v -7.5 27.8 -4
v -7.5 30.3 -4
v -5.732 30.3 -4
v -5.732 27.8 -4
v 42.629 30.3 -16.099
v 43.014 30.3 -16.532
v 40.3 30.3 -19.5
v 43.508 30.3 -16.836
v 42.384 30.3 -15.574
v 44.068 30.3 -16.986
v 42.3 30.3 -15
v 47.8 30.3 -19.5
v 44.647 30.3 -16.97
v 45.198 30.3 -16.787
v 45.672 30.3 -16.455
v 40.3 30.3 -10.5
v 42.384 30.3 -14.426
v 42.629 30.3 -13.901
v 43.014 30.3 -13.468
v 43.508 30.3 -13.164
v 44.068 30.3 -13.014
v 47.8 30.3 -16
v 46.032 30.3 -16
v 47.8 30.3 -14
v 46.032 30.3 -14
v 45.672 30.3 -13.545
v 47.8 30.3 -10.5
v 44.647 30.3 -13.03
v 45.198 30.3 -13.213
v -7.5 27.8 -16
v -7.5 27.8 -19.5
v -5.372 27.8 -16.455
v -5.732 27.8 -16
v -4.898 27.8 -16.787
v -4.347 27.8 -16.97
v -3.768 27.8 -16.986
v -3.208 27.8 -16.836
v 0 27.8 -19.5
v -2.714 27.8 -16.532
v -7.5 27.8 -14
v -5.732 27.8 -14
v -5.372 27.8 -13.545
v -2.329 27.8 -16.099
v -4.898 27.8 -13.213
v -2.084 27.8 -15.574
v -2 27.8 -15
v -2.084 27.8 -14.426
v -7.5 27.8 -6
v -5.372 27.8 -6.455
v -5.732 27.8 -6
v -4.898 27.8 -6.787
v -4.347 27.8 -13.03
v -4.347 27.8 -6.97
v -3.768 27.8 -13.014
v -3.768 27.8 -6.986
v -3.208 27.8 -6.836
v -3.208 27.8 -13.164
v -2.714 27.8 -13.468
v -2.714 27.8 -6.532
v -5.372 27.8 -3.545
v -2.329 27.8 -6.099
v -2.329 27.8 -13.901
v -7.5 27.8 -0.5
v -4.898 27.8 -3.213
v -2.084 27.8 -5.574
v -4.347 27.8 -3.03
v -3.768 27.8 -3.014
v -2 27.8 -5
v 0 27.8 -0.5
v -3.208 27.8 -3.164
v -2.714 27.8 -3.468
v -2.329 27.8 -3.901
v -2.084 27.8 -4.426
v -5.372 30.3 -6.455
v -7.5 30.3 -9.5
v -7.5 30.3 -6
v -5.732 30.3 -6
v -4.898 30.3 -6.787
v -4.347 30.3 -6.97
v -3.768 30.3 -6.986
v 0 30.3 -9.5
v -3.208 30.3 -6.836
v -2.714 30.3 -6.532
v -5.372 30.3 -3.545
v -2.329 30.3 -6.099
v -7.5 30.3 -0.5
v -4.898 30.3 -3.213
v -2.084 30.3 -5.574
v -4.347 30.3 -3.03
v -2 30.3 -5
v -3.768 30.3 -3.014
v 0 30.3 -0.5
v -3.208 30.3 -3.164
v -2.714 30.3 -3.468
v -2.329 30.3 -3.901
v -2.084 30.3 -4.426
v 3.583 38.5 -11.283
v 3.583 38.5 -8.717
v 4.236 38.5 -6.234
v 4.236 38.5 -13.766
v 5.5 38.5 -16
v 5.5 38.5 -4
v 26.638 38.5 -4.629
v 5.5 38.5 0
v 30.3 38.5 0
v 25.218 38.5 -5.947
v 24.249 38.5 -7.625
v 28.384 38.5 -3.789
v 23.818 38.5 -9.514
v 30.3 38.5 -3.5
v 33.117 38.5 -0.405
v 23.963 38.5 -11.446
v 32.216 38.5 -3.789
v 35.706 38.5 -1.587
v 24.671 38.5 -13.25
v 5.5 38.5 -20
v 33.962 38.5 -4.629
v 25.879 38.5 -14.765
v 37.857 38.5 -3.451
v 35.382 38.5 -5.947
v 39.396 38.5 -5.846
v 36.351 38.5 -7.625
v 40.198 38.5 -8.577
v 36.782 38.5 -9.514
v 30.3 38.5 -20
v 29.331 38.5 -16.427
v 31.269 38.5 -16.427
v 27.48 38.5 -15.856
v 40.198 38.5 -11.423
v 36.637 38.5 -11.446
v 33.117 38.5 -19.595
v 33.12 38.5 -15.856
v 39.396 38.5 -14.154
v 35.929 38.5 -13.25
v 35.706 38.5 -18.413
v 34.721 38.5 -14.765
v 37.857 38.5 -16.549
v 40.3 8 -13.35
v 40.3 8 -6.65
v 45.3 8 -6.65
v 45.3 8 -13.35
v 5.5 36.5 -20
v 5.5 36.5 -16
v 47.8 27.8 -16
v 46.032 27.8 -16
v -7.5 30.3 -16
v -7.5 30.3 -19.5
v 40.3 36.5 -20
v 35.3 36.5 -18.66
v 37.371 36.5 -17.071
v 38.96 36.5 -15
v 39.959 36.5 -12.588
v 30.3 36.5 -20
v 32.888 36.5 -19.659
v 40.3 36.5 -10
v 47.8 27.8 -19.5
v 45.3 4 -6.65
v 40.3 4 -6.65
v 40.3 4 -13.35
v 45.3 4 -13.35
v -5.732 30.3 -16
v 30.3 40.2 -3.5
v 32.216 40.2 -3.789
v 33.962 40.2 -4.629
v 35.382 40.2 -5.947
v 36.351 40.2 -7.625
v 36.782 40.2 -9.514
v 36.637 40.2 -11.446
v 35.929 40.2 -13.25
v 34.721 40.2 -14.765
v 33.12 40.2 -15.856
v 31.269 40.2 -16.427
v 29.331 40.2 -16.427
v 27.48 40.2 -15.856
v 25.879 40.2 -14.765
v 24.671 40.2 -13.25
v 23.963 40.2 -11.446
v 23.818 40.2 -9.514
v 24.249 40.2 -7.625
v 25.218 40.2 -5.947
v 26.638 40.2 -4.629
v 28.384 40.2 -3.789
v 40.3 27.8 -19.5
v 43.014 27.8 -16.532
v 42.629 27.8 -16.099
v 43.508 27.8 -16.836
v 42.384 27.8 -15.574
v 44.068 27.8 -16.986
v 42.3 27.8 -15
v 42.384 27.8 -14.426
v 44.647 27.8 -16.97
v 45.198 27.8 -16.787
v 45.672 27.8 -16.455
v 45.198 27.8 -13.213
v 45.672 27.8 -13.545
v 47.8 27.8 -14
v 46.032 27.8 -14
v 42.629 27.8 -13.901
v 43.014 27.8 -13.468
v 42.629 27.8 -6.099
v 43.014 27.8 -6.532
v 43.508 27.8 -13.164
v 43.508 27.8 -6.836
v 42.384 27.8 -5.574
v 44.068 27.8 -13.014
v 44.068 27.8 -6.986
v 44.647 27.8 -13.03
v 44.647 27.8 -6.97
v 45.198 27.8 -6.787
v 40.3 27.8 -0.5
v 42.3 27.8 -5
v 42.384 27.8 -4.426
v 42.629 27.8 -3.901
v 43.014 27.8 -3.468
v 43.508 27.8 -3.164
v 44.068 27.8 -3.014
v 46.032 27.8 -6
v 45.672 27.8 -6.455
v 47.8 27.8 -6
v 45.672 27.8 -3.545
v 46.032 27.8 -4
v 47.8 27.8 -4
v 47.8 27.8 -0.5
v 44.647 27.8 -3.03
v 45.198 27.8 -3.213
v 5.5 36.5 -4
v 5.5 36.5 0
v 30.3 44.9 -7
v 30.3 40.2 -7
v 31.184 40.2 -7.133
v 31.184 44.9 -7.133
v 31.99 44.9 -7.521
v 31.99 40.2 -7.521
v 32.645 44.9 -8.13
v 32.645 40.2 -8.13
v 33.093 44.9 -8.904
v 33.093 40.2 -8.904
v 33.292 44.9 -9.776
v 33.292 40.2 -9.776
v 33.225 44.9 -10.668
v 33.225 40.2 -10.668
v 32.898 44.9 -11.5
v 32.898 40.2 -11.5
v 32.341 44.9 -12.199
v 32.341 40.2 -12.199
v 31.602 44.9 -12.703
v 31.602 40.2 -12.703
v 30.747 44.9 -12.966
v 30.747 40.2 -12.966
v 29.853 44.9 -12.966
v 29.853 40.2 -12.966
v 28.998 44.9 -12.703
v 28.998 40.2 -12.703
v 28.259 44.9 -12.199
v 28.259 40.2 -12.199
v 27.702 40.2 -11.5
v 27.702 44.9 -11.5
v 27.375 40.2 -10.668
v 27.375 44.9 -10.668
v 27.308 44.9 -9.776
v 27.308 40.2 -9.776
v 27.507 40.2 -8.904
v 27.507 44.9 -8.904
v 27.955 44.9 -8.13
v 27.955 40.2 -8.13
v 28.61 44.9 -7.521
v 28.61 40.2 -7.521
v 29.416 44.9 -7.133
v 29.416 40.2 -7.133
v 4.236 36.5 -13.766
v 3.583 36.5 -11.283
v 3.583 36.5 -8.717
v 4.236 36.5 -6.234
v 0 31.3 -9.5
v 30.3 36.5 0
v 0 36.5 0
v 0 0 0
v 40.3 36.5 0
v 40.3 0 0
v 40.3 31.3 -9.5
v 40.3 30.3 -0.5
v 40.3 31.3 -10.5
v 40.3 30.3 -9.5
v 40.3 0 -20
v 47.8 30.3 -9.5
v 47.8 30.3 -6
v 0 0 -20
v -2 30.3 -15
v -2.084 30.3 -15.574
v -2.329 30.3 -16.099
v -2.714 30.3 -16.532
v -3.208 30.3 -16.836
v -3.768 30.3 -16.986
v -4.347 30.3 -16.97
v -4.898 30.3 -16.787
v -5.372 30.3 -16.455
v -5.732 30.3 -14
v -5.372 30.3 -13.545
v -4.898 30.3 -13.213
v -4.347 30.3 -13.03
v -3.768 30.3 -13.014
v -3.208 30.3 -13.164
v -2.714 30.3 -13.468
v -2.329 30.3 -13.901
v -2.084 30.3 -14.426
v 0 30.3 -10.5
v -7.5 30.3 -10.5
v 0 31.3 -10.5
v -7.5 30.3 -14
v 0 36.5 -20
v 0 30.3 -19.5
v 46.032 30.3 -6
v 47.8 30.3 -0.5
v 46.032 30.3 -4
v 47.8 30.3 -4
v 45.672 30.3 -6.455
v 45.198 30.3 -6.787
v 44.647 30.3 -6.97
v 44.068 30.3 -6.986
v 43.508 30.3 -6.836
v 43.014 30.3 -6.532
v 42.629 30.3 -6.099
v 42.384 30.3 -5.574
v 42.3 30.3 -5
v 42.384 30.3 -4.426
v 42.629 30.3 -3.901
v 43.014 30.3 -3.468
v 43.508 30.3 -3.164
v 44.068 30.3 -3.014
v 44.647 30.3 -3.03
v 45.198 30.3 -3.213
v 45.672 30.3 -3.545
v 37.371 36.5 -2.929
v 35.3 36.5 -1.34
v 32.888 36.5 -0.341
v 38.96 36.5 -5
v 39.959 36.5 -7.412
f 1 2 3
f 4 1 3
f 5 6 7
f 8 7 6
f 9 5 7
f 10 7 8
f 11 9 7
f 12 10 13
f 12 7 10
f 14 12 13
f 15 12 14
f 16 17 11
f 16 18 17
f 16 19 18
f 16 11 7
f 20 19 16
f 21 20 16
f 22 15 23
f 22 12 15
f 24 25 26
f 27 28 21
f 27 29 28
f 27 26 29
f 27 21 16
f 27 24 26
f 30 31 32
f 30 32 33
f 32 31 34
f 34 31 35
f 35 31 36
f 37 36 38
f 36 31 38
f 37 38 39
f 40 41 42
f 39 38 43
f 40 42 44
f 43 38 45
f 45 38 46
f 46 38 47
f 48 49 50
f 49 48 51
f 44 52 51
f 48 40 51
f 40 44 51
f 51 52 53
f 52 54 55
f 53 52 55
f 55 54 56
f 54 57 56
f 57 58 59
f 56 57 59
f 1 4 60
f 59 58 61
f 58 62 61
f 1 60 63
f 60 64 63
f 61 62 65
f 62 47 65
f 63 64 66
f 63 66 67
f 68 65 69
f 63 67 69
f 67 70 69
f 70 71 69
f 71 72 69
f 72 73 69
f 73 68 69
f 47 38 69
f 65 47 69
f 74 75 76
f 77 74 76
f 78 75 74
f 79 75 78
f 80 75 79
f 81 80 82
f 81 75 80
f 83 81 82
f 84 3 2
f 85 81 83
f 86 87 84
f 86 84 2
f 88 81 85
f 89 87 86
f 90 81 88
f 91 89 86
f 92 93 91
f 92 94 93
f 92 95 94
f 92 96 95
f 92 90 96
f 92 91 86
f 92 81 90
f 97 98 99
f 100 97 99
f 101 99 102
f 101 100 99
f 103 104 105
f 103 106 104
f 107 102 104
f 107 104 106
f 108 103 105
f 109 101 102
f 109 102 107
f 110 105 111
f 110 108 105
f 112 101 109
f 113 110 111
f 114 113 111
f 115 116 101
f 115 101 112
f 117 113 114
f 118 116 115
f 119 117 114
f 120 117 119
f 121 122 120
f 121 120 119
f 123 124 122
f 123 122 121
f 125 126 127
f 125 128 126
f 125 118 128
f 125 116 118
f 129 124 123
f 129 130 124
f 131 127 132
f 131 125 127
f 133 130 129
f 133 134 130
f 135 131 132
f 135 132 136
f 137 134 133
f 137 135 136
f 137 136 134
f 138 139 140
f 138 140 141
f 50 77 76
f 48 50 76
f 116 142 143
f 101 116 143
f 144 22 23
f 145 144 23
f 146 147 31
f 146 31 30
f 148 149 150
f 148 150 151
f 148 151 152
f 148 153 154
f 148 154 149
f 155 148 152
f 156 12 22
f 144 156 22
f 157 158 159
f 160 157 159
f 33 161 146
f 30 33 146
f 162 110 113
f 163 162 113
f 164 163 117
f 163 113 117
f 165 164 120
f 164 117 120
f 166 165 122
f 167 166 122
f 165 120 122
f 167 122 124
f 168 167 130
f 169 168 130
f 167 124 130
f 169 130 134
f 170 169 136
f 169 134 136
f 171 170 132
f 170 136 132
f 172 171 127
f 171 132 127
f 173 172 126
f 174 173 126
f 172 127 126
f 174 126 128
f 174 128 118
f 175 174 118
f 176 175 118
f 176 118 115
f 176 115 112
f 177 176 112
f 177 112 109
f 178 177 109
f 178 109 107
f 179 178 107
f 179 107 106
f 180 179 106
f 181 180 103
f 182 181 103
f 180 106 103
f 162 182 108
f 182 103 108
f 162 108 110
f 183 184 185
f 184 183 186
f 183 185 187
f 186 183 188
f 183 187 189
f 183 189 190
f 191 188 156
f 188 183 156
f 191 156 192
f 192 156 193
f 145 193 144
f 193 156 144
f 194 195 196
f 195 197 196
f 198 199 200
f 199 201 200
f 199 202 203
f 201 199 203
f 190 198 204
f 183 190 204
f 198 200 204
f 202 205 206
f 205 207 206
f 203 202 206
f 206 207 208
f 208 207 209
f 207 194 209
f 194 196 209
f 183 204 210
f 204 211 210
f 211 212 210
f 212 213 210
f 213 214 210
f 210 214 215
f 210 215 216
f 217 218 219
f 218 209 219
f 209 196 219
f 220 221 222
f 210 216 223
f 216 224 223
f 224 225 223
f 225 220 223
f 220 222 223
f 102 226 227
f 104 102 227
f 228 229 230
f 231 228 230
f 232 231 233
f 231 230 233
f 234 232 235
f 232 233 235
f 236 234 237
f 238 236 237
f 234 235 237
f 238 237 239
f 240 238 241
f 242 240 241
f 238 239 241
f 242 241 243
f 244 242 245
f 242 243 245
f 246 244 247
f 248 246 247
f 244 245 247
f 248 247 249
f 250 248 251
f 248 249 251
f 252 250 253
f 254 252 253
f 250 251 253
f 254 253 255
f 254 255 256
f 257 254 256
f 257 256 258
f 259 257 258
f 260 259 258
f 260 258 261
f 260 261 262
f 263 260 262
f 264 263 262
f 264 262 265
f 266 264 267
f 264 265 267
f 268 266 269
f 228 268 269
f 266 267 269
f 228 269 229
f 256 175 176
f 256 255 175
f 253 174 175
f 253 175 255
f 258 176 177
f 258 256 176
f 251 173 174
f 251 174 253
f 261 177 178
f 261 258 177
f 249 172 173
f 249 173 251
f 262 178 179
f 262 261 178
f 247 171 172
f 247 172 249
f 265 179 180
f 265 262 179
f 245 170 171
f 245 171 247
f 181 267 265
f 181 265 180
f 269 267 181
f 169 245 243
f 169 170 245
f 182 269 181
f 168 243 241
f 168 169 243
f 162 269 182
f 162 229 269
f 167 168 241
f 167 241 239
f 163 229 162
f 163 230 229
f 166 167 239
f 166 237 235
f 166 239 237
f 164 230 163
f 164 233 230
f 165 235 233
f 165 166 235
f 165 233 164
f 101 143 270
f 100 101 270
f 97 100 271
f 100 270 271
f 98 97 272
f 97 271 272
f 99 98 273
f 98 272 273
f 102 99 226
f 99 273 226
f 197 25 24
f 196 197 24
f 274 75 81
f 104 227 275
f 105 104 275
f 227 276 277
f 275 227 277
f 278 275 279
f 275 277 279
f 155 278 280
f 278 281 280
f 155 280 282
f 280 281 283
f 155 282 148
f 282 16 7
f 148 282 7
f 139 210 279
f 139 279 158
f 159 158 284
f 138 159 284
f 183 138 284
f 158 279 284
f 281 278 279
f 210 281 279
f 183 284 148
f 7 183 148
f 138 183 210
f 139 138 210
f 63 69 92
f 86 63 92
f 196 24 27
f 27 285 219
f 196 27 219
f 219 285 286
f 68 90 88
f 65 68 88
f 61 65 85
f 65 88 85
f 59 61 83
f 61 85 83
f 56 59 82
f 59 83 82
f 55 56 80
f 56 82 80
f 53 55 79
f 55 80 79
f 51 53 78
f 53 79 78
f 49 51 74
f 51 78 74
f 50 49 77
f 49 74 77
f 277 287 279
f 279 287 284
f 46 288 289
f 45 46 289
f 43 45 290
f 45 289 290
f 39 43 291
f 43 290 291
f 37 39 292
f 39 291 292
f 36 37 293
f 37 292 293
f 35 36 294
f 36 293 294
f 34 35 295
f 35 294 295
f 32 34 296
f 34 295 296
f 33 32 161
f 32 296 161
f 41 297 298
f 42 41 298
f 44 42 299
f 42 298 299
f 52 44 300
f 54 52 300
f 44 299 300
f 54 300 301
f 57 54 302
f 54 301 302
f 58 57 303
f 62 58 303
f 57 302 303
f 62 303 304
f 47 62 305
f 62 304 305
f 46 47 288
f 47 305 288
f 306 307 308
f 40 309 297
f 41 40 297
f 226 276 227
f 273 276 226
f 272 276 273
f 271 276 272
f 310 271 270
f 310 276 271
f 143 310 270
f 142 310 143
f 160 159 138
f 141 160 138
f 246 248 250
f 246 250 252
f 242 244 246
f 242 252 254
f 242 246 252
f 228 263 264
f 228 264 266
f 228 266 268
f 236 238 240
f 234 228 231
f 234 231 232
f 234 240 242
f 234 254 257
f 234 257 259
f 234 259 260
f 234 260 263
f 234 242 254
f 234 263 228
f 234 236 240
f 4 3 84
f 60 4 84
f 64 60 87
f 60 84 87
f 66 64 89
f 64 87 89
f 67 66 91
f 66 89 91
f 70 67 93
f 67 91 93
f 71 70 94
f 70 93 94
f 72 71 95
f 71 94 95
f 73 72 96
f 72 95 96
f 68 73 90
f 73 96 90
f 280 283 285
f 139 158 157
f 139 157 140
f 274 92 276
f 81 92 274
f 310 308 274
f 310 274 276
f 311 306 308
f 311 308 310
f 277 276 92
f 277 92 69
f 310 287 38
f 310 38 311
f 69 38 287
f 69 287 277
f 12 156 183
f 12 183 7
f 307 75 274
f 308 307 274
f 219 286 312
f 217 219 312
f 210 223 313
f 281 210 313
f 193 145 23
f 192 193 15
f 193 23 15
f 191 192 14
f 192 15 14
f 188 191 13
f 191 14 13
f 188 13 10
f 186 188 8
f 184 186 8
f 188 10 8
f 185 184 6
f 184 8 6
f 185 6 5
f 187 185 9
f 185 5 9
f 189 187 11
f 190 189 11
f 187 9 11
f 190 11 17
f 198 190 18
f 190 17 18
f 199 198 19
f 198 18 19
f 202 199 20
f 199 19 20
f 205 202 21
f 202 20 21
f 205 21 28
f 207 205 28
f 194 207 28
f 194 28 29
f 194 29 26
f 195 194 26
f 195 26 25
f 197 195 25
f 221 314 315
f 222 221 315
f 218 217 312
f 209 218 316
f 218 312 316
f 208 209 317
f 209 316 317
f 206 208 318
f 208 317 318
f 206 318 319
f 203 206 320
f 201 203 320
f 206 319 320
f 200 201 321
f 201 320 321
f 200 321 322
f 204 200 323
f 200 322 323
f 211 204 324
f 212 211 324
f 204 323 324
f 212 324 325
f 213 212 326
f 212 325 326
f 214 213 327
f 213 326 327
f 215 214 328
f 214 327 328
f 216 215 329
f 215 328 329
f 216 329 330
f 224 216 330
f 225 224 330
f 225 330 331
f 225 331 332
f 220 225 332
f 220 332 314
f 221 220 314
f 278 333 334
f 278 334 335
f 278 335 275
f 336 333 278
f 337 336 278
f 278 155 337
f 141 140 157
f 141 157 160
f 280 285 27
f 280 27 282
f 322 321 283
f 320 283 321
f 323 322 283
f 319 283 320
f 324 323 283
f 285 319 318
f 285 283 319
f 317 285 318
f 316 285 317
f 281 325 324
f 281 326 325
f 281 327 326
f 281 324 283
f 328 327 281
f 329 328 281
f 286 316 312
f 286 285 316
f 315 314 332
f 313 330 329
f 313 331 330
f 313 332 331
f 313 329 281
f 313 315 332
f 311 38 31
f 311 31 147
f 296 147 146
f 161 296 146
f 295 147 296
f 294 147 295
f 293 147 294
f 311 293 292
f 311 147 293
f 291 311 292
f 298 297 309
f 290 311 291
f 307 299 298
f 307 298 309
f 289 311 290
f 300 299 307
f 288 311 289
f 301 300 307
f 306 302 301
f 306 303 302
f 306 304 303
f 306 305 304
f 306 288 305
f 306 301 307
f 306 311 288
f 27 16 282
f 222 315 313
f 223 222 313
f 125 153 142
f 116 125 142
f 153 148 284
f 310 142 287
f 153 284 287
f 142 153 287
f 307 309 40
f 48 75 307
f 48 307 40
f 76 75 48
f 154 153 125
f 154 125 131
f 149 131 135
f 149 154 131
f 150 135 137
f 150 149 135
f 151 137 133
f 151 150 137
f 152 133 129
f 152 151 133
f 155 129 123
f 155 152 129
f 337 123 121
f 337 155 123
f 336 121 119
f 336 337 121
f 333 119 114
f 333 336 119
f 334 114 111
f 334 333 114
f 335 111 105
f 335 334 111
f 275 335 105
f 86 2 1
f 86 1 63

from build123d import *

# Parameters (mm, degrees)
SKETCH1_W                = 40.3
SKETCH1_H                = 20
BOSS_EXTRUDE1_DEPTH      = 36.5
BOSS_EXTRUDE2_DEPTH      = 7.5
BOSS_EXTRUDE2_DEPTH_BACK = 47.8
SKETCH2_W                = 19
SKETCH2_H                = 2.5
CUT_EXTRUDE1_DEPTH       = 7.5
SKETCH5_W                = 7.5
SKETCH5_H                = 1
BOSS_EXTRUDE3_DEPTH      = 1
CUT_EXTRUDE2_DEPTH       = 1
BOSS_EXTRUDE4_DEPTH      = 2
SKETCH8_R                = 6.5
BOSS_EXTRUDE5_DEPTH      = 1.7
SKETCH9_R                = 3
BOSS_EXTRUDE6_DEPTH      = 4.7
SKETCH10_W               = 6.7
SKETCH10_H               = 4
BOSS_EXTRUDE7_DEPTH      = 5


with BuildPart() as part:
    # Sketch1 → Boss-Extrude1 (new body)
    with BuildSketch(Plane(origin=(0, 0, 0), x_dir=(1, 0, 0), z_dir=(0, 1, 0))):
        with Locations((20.15, 10)):
            Rectangle(SKETCH1_W, SKETCH1_H)
    extrude(amount=BOSS_EXTRUDE1_DEPTH)

    # Sketch2 → Boss-Extrude2 (add, two sides: drawn at the far end of the back side and taken through both)
    with BuildSketch(Plane.ZY.offset(-BOSS_EXTRUDE2_DEPTH_BACK)):
        with Locations((-10, 29.05)):
            Rectangle(SKETCH2_W, SKETCH2_H)
    extrude(amount=BOSS_EXTRUDE2_DEPTH + BOSS_EXTRUDE2_DEPTH_BACK)

    # Sketch3 → Cut-Extrude1 (cut)
    with BuildSketch(Plane(origin=(0, 30.3, 0), x_dir=(1, 0, 0), z_dir=(0, 1, 0))):
        with BuildLine():
            Line((-5.732050808, 14), (-5.5, 14))
            Line((-5.5, 14), (-5.5, 16))
            Line((-5.5, 16), (-5.732050808, 16))
            ThreePointArc((-5.732050808, 16), (-6, 15), (-5.732050808, 14))
        make_face()
        with BuildLine():
            Line((-5.5, 16), (-5.5, 14))
            Line((-5.5, 14), (-5.732050808, 14))
            ThreePointArc((-5.732050808, 14), (-3.48236191, 13.068148347), (-2, 15))
            ThreePointArc((-2, 15), (-3.48236191, 16.931851653), (-5.732050808, 16))
            Line((-5.732050808, 16), (-5.5, 16))
        make_face()
        with BuildLine():
            Line((-7.5, 14), (-5.732050808, 14))
            ThreePointArc((-5.732050808, 14), (-6, 15), (-5.732050808, 16))
            Line((-5.732050808, 16), (-7.5, 16))
            Line((-7.5, 16), (-7.5, 14))
        make_face()
        with BuildLine():
            Line((-7.5, 4), (-5.732050808, 4))
            ThreePointArc((-5.732050808, 4), (-6, 5), (-5.732050808, 6))
            Line((-5.732050808, 6), (-7.5, 6))
            Line((-7.5, 6), (-7.5, 4))
        make_face()
        with BuildLine():
            Line((-5.732050808, 4), (-5.5, 4))
            Line((-5.5, 4), (-5.5, 6))
            Line((-5.5, 6), (-5.732050808, 6))
            ThreePointArc((-5.732050808, 6), (-6, 5), (-5.732050808, 4))
        make_face()
        with BuildLine():
            Line((-5.5, 6), (-5.5, 4))
            Line((-5.5, 4), (-5.732050808, 4))
            ThreePointArc((-5.732050808, 4), (-3.48236191, 3.068148347), (-2, 5))
            ThreePointArc((-2, 5), (-3.48236191, 6.931851653), (-5.732050808, 6))
            Line((-5.732050808, 6), (-5.5, 6))
        make_face()
        with BuildLine():
            ThreePointArc((46.032050808, 16), (42.3, 15), (46.032050808, 14))
            Line((46.032050808, 14), (45.8, 14))
            Line((45.8, 14), (45.8, 16))
            Line((45.8, 16), (46.032050808, 16))
        make_face()
        with BuildLine():
            Line((45.8, 14), (46.032050808, 14))
            ThreePointArc((46.032050808, 14), (46.231851653, 14.48236191), (46.3, 15))
            ThreePointArc((46.3, 15), (46.231851653, 15.51763809), (46.032050808, 16))
            Line((46.032050808, 16), (45.8, 16))
            Line((45.8, 16), (45.8, 14))
        make_face()
        with BuildLine():
            Line((46.032050808, 14), (47.8, 14))
            Line((47.8, 14), (47.8, 16))
            Line((47.8, 16), (46.032050808, 16))
            ThreePointArc((46.032050808, 16), (46.231851653, 15.51763809), (46.3, 15))
            ThreePointArc((46.3, 15), (46.231851653, 14.48236191), (46.032050808, 14))
        make_face()
        with BuildLine():
            ThreePointArc((46.032050808, 6), (42.3, 5), (46.032050808, 4))
            Line((46.032050808, 4), (45.8, 4))
            Line((45.8, 4), (45.8, 6))
            Line((45.8, 6), (46.032050808, 6))
        make_face()
        with BuildLine():
            Line((45.8, 4), (46.032050808, 4))
            ThreePointArc((46.032050808, 4), (46.231851653, 4.48236191), (46.3, 5))
            ThreePointArc((46.3, 5), (46.231851653, 5.51763809), (46.032050808, 6))
            Line((46.032050808, 6), (45.8, 6))
            Line((45.8, 6), (45.8, 4))
        make_face()
        with BuildLine():
            Line((46.032050808, 4), (47.8, 4))
            Line((47.8, 4), (47.8, 6))
            Line((47.8, 6), (46.032050808, 6))
            ThreePointArc((46.032050808, 6), (46.231851653, 5.51763809), (46.3, 5))
            ThreePointArc((46.3, 5), (46.231851653, 4.48236191), (46.032050808, 4))
        make_face()
    extrude(amount=-CUT_EXTRUDE1_DEPTH, mode=Mode.SUBTRACT)

    # Sketch5 → Boss-Extrude3 (add)
    with BuildSketch(Plane(origin=(0, 30.3, 0), x_dir=(1, 0, 0), z_dir=(0, 1, 0))):
        with Locations((44.05, 10)):
            Rectangle(SKETCH5_W, SKETCH5_H)
        with Locations((-3.75, 10)):
            Rectangle(SKETCH5_W, SKETCH5_H)
    extrude(amount=BOSS_EXTRUDE3_DEPTH)

    # Sketch6 → Cut-Extrude2 (cut)
    with BuildSketch(Plane.XY.offset(-9.5)):
        Polygon((0, 31.3), (-7.5, 31.3), (-7.5, 30.3), align=None)
        Polygon((47.8, 30.3), (40.3, 31.3), (47.8, 31.3), align=None)
    extrude(amount=-CUT_EXTRUDE2_DEPTH, mode=Mode.SUBTRACT)

    # Sketch7 → Boss-Extrude4 (add)
    with BuildSketch(Plane(origin=(0, 36.5, 0), x_dir=(1, 0, 0), z_dir=(0, 1, 0))):
        with BuildLine():
            Line((30.3, 20), (13.5, 20))
            ThreePointArc((13.5, 20), (9.027864045, 18.94427191), (5.5, 16))
            Line((5.5, 16), (5.5, 4))
            ThreePointArc((5.5, 4), (9.027864045, 1.05572809), (13.5, 0))
            Line((13.5, 0), (30.3, 0))
            Line((30.3, 0), (30.3, 20))
        make_face()
        with BuildLine():
            Line((5.5, 4), (5.5, 16))
            ThreePointArc((5.5, 16), (3.5, 10), (5.5, 4))
        make_face()
        with BuildLine():
            Line((13.5, 20), (5.5, 20))
            Line((5.5, 20), (5.5, 16))
            ThreePointArc((5.5, 16), (9.027864045, 18.94427191), (13.5, 20))
        make_face()
        with BuildLine():
            ThreePointArc((13.5, 0), (9.027864045, 1.05572809), (5.5, 4))
            Line((5.5, 4), (5.5, 0))
            Line((5.5, 0), (13.5, 0))
        make_face()
        with BuildLine():
            ThreePointArc((30.3, 20), (40.3, 10), (30.3, 0))
            Line((30.3, 0), (30.3, 20))
        make_face()
    extrude(amount=BOSS_EXTRUDE4_DEPTH)

    # Sketch8 → Boss-Extrude5 (add)
    with BuildSketch(Plane(origin=(0, 38.5, 0), x_dir=(1, 0, 0), z_dir=(0, 1, 0))):
        with Locations(Location((30.3, 10, 0), (0, 0, 270))):
            Circle(SKETCH8_R)
    extrude(amount=BOSS_EXTRUDE5_DEPTH)

    # Sketch9 → Boss-Extrude6 (add)
    with BuildSketch(Plane(origin=(0, 40.2, 0), x_dir=(1, 0, 0), z_dir=(0, 1, 0))):
        with Locations(Location((30.3, 10, 0), (0, 0, 270))):
            Circle(SKETCH9_R)
    extrude(amount=BOSS_EXTRUDE6_DEPTH)

    # Sketch10 → Boss-Extrude7 (add)
    with BuildSketch(Plane(origin=(40.3, 0, 0), x_dir=(0, 0, -1), z_dir=(1, 0, 0))):
        with Locations((10, 6)):
            Rectangle(SKETCH10_W, SKETCH10_H)
    extrude(amount=BOSS_EXTRUDE7_DEPTH)


solid = part.part
